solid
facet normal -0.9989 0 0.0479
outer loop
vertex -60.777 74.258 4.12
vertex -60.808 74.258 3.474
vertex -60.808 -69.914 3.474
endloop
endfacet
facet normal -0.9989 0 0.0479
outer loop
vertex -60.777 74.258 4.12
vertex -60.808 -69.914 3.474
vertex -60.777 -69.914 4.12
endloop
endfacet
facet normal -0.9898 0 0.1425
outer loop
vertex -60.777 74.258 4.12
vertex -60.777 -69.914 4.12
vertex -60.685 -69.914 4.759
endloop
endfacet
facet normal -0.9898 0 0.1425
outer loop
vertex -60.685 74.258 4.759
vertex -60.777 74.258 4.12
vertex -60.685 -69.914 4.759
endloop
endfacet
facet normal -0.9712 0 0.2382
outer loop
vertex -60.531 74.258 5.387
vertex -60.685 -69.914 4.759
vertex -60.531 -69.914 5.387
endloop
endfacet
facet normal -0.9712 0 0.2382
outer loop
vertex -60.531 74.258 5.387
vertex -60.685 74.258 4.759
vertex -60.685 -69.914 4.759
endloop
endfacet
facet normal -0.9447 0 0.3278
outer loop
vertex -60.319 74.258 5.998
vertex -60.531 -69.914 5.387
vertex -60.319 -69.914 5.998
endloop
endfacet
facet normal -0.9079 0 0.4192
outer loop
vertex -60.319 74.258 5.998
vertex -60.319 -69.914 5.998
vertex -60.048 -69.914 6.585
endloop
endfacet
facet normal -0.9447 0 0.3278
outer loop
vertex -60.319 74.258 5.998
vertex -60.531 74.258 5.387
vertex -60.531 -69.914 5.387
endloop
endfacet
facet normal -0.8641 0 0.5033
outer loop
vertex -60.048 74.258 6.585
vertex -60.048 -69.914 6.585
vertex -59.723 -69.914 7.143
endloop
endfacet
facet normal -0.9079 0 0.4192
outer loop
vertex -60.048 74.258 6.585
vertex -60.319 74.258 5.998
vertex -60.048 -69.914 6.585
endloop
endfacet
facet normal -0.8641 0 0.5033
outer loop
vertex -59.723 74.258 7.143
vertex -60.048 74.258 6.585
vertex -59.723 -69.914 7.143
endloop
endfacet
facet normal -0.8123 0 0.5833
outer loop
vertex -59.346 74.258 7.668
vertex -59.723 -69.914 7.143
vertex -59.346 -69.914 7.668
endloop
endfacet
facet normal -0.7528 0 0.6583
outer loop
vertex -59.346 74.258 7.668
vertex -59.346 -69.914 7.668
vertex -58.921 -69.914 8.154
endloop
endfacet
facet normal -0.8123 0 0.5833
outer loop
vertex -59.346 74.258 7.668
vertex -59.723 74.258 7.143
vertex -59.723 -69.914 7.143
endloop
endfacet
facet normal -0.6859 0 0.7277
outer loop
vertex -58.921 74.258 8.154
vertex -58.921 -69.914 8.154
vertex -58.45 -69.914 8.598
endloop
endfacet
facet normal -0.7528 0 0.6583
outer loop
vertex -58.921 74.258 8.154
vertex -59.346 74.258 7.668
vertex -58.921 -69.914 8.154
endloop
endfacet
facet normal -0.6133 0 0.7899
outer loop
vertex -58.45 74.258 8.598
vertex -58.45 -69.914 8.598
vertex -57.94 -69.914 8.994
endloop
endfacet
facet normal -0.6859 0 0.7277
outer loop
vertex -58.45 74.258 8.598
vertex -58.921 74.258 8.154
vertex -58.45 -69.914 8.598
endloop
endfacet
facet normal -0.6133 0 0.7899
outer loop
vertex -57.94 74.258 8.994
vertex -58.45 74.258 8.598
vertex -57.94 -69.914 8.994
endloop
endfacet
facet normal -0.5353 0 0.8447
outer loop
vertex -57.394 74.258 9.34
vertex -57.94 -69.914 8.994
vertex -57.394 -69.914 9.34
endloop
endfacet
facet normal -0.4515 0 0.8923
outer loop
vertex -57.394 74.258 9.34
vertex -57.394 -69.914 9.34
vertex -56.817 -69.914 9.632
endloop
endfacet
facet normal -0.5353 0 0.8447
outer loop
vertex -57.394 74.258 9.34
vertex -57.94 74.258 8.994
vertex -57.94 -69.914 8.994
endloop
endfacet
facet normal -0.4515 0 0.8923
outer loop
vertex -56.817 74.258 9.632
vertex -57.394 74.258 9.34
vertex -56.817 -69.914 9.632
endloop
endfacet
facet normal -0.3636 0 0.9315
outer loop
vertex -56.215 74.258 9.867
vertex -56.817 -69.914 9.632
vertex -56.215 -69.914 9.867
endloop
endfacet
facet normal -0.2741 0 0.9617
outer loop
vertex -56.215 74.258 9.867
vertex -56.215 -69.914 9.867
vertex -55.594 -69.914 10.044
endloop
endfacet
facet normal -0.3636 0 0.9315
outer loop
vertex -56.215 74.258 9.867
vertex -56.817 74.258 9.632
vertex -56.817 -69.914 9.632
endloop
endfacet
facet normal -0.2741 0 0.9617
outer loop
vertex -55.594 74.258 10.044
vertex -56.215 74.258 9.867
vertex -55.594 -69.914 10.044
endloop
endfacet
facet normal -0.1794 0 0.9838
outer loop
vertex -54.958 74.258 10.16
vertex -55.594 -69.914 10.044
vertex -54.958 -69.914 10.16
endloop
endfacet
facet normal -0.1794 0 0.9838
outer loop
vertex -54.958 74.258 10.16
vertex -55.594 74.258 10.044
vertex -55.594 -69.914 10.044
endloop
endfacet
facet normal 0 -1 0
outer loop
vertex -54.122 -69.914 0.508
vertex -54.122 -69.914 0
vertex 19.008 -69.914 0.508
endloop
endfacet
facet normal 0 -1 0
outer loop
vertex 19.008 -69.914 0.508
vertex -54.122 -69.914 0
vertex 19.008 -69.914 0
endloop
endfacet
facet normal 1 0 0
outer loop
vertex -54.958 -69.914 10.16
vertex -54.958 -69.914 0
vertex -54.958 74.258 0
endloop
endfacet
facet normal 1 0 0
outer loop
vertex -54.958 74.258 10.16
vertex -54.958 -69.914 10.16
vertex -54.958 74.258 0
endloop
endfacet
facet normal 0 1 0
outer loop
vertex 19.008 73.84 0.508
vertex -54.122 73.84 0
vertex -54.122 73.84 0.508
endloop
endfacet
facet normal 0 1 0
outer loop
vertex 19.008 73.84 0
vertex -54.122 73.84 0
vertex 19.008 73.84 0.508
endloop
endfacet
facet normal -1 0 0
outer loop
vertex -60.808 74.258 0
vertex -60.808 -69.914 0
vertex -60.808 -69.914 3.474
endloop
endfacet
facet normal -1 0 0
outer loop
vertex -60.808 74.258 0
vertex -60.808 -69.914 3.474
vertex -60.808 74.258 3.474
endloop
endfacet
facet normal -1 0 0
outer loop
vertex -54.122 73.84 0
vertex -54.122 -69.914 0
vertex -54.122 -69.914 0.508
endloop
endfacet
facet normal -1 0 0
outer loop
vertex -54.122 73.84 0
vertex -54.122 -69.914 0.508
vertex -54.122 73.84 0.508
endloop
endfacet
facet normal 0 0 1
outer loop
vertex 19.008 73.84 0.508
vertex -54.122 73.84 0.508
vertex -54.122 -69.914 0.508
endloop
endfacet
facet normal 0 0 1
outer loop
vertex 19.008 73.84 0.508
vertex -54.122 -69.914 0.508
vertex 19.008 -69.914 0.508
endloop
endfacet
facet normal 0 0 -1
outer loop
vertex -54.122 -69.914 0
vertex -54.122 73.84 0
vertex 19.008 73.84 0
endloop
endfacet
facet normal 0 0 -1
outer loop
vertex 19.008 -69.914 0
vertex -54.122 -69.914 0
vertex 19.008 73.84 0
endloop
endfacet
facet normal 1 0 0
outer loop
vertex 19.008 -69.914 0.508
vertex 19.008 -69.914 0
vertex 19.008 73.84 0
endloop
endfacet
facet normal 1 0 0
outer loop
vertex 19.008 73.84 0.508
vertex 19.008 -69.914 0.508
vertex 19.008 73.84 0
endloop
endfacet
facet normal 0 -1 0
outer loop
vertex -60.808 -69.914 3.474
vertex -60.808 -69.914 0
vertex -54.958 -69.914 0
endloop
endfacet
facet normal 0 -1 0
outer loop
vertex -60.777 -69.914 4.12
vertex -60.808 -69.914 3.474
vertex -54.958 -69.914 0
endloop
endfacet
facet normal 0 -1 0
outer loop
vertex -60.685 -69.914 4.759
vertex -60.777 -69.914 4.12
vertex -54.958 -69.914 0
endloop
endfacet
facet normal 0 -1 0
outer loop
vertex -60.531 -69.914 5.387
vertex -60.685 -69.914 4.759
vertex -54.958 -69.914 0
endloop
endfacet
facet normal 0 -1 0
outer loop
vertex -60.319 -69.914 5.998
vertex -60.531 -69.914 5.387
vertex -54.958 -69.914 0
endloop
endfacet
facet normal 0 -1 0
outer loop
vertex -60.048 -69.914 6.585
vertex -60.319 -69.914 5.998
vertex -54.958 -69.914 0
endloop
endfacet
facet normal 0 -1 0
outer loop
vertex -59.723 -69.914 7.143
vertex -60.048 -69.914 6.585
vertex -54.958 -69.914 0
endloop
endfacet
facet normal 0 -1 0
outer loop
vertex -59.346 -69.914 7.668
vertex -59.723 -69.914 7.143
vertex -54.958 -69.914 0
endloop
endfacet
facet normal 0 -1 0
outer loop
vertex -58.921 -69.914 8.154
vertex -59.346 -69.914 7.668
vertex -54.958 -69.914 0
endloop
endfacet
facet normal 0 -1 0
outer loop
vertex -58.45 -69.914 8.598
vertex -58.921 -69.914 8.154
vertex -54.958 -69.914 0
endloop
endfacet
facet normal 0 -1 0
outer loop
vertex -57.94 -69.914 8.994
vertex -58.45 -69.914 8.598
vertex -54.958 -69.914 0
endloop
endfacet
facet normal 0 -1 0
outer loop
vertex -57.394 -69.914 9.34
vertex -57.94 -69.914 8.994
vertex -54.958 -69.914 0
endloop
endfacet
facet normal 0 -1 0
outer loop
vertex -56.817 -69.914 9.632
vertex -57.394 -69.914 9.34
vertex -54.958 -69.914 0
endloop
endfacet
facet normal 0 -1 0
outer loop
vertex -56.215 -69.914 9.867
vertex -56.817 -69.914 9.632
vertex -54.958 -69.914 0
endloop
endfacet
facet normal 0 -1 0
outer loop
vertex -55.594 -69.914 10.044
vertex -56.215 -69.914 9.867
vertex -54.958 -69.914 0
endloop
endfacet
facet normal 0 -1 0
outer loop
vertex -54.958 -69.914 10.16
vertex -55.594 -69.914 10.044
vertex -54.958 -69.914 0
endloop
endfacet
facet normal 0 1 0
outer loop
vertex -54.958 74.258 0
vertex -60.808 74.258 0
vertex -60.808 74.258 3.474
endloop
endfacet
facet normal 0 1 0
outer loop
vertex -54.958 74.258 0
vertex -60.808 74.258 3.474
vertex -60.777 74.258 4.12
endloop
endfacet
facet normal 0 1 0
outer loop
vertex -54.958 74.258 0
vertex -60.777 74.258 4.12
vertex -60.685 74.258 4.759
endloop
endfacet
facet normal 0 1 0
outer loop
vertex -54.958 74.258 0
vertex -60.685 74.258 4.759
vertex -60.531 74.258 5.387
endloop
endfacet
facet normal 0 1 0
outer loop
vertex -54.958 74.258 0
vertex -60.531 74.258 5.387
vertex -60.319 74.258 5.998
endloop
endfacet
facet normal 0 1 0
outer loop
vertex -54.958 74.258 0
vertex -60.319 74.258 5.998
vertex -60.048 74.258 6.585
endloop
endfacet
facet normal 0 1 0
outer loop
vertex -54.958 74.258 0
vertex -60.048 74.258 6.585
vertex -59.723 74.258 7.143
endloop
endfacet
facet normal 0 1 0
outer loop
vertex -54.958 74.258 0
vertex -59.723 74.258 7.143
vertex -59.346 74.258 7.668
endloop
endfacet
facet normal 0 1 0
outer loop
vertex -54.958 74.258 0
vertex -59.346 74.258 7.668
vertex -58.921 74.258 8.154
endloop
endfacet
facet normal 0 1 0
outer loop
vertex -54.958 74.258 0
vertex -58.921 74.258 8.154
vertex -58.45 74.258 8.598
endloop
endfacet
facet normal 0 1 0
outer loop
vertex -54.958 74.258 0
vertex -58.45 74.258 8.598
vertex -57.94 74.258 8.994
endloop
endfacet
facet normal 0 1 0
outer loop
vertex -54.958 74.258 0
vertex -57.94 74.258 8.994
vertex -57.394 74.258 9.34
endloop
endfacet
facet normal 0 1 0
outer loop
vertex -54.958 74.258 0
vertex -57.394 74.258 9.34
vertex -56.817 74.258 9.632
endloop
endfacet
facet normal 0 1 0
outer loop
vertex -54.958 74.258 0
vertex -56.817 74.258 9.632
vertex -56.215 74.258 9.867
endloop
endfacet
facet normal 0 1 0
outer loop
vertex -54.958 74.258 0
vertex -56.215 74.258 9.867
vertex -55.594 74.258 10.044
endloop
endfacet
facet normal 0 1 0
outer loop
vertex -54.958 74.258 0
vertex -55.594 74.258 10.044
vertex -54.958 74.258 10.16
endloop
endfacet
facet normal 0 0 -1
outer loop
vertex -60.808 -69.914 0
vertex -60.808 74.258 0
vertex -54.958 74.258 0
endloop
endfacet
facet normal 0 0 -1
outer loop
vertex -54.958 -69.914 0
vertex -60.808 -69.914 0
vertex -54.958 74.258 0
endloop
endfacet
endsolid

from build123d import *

# Parameters (mm, degrees)
F1_W        = 5.8504454792
F1_H        = 144.171692431
F2_DEPTH    = 10.16
F0_W        = 73.1305684894
F0_H        = 143.7538042665
F3_DEPTH    = 0.508
F4_T1_DEPTH = 177.600144384


# Not quite as in the source:
# - a fillet or chamfer that OpenCascade refuses, or shapes differently, is made with other operations: its cross-section is extruded or revolved along the edge and cut away or added


with BuildPart() as f2:
    # F1 (on Top) → F2 (new body)
    with BuildSketch(Plane.XY):
        with Locations((-57.8831378371, 2.1721757948)):
            Rectangle(F1_W, F1_H)
    extrude(amount=F2_DEPTH)

    # F4: fillet of radius 6.7453126933 on 1 edges, made by hand

    # F4_s2 → F4_t1 (cut)
    with BuildSketch(Plane.XZ.offset(-90.9722479869)):
        with BuildLine():
            ThreePointArc((-60.8083605766, 3.4743096094), (-59.1392375227, 7.9163296539), (-54.9579150975, 10.16))
            Line((-54.9579150975, 10.16), (-60.8083605766, 10.16))
            Line((-60.8083605766, 10.16), (-60.8083605766, 3.4743096094))
        make_face()
    extrude(amount=F4_T1_DEPTH, mode=Mode.SUBTRACT)


with BuildPart() as f3:
    # F0 (on Top) → F3 (new body)
    with BuildSketch(Plane.XY):
        with Locations((-17.5568545237, 1.9632317126)):
            Rectangle(F0_W, F0_H)
    extrude(amount=F3_DEPTH)


solid = Compound([f2.part, f3.part])
